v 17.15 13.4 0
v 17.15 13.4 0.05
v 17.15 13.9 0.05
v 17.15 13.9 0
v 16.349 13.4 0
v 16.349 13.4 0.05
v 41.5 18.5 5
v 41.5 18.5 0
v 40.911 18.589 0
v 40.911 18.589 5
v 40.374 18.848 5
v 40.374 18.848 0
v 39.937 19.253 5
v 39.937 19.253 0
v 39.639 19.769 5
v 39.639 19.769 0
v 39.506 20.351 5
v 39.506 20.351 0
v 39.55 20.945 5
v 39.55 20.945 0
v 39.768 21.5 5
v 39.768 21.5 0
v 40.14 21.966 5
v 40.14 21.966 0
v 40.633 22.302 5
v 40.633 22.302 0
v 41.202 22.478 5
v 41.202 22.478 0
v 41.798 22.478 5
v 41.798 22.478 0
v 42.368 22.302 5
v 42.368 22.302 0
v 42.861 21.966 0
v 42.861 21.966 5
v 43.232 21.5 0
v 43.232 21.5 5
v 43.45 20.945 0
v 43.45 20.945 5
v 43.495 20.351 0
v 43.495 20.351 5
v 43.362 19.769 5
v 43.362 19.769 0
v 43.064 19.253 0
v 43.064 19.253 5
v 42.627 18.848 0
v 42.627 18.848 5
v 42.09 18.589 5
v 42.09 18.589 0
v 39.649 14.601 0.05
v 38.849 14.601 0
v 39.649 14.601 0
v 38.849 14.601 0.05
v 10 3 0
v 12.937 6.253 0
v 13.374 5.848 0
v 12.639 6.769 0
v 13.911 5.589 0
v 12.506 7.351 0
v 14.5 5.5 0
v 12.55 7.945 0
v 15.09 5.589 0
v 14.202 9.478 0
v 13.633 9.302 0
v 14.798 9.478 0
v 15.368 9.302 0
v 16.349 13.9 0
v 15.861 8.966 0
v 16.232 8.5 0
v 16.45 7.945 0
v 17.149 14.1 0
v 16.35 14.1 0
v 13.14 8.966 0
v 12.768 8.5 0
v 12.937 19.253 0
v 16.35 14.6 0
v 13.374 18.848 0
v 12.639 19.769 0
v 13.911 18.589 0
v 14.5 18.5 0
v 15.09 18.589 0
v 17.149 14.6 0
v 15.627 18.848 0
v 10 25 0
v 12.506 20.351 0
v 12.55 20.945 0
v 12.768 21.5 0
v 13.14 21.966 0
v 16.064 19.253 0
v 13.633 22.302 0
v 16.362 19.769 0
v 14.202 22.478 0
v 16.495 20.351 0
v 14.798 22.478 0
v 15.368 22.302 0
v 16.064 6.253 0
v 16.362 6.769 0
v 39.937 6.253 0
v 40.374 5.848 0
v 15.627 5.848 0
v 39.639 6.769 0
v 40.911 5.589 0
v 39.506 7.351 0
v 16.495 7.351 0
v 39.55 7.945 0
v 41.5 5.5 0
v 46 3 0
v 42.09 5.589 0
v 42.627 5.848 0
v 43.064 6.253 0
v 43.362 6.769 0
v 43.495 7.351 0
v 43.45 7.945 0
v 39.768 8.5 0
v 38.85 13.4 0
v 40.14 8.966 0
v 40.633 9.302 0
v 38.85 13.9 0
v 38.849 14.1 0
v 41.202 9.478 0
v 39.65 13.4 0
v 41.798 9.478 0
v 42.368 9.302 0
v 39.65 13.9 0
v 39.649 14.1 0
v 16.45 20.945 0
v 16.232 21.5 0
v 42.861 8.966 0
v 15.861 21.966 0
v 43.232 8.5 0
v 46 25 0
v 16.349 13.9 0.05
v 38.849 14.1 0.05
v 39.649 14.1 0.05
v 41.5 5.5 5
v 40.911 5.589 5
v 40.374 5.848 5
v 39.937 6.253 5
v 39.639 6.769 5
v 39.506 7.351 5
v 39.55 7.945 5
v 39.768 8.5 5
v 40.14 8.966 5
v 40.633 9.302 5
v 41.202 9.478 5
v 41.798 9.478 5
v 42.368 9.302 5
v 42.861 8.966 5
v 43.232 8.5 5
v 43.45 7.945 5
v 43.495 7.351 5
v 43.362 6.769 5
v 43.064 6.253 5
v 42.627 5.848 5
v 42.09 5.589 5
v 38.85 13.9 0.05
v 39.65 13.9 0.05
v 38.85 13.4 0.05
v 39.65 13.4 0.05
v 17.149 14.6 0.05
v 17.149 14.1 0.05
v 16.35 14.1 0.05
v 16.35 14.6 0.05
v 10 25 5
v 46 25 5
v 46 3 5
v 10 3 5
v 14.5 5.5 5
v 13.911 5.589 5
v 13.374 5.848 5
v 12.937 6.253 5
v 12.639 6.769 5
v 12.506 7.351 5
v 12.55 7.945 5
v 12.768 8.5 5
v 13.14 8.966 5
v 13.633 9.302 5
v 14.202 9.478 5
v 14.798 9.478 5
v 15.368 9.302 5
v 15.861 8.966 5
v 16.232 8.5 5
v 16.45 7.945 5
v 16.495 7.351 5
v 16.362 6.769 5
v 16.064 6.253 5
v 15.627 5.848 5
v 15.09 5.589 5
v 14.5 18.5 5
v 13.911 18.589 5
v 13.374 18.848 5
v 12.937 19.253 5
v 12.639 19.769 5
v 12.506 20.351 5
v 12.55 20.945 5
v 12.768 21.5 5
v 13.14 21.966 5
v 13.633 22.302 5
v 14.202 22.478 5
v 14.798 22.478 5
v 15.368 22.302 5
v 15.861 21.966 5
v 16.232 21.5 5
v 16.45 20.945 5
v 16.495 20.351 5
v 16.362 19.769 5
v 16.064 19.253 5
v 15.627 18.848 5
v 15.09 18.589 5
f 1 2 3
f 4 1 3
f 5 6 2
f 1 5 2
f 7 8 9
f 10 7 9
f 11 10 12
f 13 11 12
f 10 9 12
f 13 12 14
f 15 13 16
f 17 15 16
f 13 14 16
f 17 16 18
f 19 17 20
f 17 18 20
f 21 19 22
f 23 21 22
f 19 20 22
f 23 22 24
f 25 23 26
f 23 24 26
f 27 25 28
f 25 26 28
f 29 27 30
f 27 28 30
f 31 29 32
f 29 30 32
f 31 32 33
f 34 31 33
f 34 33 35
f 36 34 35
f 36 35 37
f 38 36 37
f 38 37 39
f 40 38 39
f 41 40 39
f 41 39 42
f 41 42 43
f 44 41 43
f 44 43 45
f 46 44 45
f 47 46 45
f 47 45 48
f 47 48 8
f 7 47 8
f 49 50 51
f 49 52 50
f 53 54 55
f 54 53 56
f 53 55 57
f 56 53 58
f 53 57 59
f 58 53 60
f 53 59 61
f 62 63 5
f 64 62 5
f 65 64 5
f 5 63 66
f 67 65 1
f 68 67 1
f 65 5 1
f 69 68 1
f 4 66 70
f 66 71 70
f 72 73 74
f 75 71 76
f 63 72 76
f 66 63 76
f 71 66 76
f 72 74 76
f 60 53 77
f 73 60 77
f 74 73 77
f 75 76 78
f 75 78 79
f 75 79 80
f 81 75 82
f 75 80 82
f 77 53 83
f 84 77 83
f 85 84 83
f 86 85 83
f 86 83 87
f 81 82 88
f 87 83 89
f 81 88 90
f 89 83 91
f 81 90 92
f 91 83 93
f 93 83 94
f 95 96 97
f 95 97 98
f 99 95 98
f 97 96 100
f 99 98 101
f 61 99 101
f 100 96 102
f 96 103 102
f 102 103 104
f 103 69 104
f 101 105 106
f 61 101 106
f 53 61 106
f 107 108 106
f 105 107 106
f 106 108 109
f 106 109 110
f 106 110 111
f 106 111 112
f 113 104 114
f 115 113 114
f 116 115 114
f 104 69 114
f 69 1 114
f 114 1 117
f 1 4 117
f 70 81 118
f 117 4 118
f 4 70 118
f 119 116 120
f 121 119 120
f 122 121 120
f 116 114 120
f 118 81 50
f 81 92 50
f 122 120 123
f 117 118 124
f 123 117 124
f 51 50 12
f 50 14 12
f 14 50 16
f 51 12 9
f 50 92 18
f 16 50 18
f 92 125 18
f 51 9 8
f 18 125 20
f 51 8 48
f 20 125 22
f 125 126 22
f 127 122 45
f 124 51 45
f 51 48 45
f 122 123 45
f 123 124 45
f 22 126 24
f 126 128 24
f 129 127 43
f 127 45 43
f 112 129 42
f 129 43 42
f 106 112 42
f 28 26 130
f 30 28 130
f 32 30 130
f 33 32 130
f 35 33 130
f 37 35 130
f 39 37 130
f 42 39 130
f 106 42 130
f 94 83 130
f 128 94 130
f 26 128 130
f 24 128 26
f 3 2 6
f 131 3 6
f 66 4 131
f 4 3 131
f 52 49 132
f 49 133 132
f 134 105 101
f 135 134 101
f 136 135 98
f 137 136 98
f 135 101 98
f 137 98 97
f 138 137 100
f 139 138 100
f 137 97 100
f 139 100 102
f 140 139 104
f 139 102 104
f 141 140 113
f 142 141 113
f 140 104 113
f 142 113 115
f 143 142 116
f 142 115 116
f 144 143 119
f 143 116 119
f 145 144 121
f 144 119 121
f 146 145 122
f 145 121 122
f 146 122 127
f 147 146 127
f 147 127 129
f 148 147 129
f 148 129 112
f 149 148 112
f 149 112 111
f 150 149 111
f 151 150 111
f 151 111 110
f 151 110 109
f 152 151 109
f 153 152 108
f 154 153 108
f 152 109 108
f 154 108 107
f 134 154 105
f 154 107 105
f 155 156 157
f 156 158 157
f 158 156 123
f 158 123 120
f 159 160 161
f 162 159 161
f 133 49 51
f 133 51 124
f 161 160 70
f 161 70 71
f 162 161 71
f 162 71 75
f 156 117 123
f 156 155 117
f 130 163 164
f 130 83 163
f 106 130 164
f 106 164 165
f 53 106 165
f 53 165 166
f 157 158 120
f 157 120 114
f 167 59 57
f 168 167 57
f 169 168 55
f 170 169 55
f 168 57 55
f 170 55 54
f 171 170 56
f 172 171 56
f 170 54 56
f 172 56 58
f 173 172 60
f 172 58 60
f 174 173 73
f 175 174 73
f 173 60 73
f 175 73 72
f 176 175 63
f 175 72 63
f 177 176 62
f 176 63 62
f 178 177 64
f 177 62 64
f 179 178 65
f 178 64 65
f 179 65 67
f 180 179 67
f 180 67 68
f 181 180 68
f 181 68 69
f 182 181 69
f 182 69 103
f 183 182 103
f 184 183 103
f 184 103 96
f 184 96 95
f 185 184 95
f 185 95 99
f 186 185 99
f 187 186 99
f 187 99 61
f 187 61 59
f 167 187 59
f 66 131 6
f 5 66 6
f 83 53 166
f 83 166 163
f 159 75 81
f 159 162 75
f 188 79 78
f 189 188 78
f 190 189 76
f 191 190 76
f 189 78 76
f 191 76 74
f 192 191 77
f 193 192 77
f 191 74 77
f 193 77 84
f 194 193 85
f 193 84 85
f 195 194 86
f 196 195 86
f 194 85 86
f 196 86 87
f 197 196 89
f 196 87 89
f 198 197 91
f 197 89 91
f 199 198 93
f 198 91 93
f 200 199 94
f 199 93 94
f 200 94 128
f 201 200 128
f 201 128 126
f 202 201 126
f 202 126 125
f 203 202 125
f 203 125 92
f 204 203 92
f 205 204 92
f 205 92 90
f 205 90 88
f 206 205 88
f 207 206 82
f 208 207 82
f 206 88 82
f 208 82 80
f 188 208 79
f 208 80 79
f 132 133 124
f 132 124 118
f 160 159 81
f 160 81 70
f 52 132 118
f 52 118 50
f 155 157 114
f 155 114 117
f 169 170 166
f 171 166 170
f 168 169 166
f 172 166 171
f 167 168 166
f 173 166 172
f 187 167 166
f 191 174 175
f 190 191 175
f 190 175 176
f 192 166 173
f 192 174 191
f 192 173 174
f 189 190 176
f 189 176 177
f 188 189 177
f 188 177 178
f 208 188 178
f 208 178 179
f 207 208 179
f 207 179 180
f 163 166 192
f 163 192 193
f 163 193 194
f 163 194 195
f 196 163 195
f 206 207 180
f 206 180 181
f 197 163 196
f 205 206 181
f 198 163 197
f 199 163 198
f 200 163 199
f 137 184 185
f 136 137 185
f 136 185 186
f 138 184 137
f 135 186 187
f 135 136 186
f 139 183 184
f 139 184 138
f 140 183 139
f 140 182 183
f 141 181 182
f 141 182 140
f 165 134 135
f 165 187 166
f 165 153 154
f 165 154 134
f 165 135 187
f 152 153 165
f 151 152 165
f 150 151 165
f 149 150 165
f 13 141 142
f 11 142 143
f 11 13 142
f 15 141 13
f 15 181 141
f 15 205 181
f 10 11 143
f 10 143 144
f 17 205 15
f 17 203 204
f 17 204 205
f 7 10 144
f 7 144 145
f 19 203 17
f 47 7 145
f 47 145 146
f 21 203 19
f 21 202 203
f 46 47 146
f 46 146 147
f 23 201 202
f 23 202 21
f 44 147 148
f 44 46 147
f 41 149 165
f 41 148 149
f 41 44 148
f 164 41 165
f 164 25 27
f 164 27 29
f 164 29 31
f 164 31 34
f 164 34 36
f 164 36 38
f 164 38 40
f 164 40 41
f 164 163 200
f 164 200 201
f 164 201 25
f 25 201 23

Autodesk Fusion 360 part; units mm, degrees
sketch "Sketch1" plane through (0, 0, 0) normal (0, 0, 1) x (1, 0, 0)
  line L0 (10, 25) -> (46, 25)
  line L1 (46, 25) -> (46, 3)
  line L2 (46, 3) -> (10, 3)
  line L3 (10, 3) -> (10, 25)
  dimension "d1" = 36
  dimension "d2" = 22
extrude "Extrude1" add sketch "Sketch1" along normal blind 5
sketch "Sketch2" plane through (0, 0, 5) normal (0, 0, 1) x (-1, 0, 0)
  line L0 (-10, -3) -> (-46, -3)
  line L1 (-46, -3) -> (-46, -25)
  line L2 (-46, -25) -> (-10, -25)
  line L3 (-10, -25) -> (-10, -3)
  line L4 (-21.9549, -14.5099) -> (-33.9998, -14.5099)
  line L5 (-33.9998, -14.5099) -> (-33.9998, -13.5007)
  line L6 (-33.9998, -13.5007) -> (-21.9549, -13.5007)
  line L7 (-21.9549, -13.5007) -> (-21.9549, -14.5099)
hole "Hole3" at (14.5003, 20.5001, 5) direction (0, 0, -1) diameter 4 depth 5 tip angle 180
pattern_linear "R-Pattern2" count 2 spacing 13 along (0, -1, 0) count 2 spacing 27 along (1, 0, 0) of "Hole3"

Autodesk Fusion 360 part; units mm, degrees
sketch "Sketch1" plane through (0, 0, 0) normal (0, 0, 1) x (1, 0, 0)
  line L0 (10, 25) -> (46, 25)
  line L1 (46, 25) -> (46, 3)
  line L2 (46, 3) -> (10, 3)
  line L3 (10, 3) -> (10, 25)
  dimension "d1" = 36
  dimension "d2" = 22
extrude "Extrude1" add sketch "Sketch1" along normal blind 0.05
sketch "Sketch5" plane through (0, 0, 0.05) normal (0, 0, 1) x (-1, 0, 0)
  line L0 (-10, -3) -> (-46, -3)
  line L1 (-46, -3) -> (-46, -25)
  line L2 (-46, -25) -> (-10, -25)
  line L3 (-10, -25) -> (-10, -3)
  line L4 (-16.7182, -15.0406) -> (-21.9549, -13.5007)
  line L5 (-21.9549, -14.5099) -> (-16.0325, -16.2515)
  line L6 (-16.7182, -15.0406) -> (-16.0325, -16.2515)
hole "Hole3" at (14.5003, 20.5001, 0.05) direction (0, 0, -1) diameter 4 depth 4 tip angle 180
pattern_linear "R-Pattern2" count 2 spacing 13 along (0, -1, 0) count 2 spacing 27 along (1, 0, 0) of "Hole3"
sketch "Sketch11" plane through (0, 0, 0.05) normal (0, 0, 1) x (-1, 0, 0)
  circle A0 centre (-41.5003, -7.5001) radius 2
  circle A1 centre (-41.5003, -20.5001) radius 2
  circle A2 centre (-14.5003, -7.5001) radius 2
  circle A3 centre (-14.5003, -20.5001) radius 2
  line L0 (-10, -3) -> (-46, -3)
  line L1 (-46, -3) -> (-46, -25)
  line L2 (-46, -25) -> (-10, -25)
  line L3 (-10, -25) -> (-10, -3)
  line L4 (-16.3501, -14.6002) -> (-17.1489, -14.6002)
  line L5 (-17.1489, -14.6002) -> (-17.1489, -14.1)
  line L6 (-17.1489, -14.1) -> (-16.3501, -14.1)
  line L7 (-16.3501, -14.1) -> (-16.3501, -14.6002)
  line L8 (-16.3495, -13.4) -> (-17.1505, -13.4)
  line L9 (-17.1505, -13.4) -> (-17.1505, -13.9)
  line L10 (-17.1505, -13.9) -> (-16.3495, -13.9)
  line L11 (-16.3495, -13.9) -> (-16.3495, -13.4)
extrude "Extrude8" cut sketch "Sketch11" against normal blind 1.6 contours L4 L5 L6 L7 | L8 L9 L10 L11
sketch "Sketch15" plane through (0, 0, 0.05) normal (0, 0, 1) x (-1, 0, 0)
  line L0 (-16.3495, -13.4) -> (-16.3495, -13.9)
  line L1 (-16.3495, -13.9) -> (-17.1505, -13.9)
  line L2 (-17.1505, -13.9) -> (-17.1505, -13.4)
  line L3 (-17.1505, -13.4) -> (-16.3495, -13.4)
  line L4 (-16.3501, -14.6002) -> (-17.1489, -14.6002)
  line L5 (-17.1489, -14.6002) -> (-17.1489, -14.1)
  line L6 (-17.1489, -14.1) -> (-16.3501, -14.1)
  line L7 (-16.3501, -14.1) -> (-16.3501, -14.6002)
  circle A0 centre (-41.5003, -7.5001) radius 2
  circle A1 centre (-41.5003, -20.5001) radius 2
  circle A2 centre (-14.5003, -7.5001) radius 2
  circle A3 centre (-14.5003, -20.5001) radius 2
  line L8 (-10, -3) -> (-46, -3)
  line L9 (-46, -3) -> (-46, -25)
  line L10 (-46, -25) -> (-10, -25)
  line L11 (-10, -25) -> (-10, -3)
  line L12 (-38.8493, -14.6007) -> (-39.6492, -14.6007)
  line L13 (-39.6492, -14.6007) -> (-39.6492, -14.1)
  line L14 (-39.6492, -14.1) -> (-38.8493, -14.1)
  line L15 (-38.8493, -14.1) -> (-38.8493, -14.6007)
  line L16 (-38.8501, -13.9) -> (-39.65, -13.9)
  line L17 (-39.65, -13.9) -> (-39.65, -13.3997)
  line L18 (-39.65, -13.3997) -> (-38.8501, -13.3997)
  line L19 (-38.8501, -13.3997) -> (-38.8501, -13.9)
extrude "Extrude10" cut sketch "Sketch15" against normal blind 1.6 contours L12 L13 L14 L15 | L16 L17 L18 L19
